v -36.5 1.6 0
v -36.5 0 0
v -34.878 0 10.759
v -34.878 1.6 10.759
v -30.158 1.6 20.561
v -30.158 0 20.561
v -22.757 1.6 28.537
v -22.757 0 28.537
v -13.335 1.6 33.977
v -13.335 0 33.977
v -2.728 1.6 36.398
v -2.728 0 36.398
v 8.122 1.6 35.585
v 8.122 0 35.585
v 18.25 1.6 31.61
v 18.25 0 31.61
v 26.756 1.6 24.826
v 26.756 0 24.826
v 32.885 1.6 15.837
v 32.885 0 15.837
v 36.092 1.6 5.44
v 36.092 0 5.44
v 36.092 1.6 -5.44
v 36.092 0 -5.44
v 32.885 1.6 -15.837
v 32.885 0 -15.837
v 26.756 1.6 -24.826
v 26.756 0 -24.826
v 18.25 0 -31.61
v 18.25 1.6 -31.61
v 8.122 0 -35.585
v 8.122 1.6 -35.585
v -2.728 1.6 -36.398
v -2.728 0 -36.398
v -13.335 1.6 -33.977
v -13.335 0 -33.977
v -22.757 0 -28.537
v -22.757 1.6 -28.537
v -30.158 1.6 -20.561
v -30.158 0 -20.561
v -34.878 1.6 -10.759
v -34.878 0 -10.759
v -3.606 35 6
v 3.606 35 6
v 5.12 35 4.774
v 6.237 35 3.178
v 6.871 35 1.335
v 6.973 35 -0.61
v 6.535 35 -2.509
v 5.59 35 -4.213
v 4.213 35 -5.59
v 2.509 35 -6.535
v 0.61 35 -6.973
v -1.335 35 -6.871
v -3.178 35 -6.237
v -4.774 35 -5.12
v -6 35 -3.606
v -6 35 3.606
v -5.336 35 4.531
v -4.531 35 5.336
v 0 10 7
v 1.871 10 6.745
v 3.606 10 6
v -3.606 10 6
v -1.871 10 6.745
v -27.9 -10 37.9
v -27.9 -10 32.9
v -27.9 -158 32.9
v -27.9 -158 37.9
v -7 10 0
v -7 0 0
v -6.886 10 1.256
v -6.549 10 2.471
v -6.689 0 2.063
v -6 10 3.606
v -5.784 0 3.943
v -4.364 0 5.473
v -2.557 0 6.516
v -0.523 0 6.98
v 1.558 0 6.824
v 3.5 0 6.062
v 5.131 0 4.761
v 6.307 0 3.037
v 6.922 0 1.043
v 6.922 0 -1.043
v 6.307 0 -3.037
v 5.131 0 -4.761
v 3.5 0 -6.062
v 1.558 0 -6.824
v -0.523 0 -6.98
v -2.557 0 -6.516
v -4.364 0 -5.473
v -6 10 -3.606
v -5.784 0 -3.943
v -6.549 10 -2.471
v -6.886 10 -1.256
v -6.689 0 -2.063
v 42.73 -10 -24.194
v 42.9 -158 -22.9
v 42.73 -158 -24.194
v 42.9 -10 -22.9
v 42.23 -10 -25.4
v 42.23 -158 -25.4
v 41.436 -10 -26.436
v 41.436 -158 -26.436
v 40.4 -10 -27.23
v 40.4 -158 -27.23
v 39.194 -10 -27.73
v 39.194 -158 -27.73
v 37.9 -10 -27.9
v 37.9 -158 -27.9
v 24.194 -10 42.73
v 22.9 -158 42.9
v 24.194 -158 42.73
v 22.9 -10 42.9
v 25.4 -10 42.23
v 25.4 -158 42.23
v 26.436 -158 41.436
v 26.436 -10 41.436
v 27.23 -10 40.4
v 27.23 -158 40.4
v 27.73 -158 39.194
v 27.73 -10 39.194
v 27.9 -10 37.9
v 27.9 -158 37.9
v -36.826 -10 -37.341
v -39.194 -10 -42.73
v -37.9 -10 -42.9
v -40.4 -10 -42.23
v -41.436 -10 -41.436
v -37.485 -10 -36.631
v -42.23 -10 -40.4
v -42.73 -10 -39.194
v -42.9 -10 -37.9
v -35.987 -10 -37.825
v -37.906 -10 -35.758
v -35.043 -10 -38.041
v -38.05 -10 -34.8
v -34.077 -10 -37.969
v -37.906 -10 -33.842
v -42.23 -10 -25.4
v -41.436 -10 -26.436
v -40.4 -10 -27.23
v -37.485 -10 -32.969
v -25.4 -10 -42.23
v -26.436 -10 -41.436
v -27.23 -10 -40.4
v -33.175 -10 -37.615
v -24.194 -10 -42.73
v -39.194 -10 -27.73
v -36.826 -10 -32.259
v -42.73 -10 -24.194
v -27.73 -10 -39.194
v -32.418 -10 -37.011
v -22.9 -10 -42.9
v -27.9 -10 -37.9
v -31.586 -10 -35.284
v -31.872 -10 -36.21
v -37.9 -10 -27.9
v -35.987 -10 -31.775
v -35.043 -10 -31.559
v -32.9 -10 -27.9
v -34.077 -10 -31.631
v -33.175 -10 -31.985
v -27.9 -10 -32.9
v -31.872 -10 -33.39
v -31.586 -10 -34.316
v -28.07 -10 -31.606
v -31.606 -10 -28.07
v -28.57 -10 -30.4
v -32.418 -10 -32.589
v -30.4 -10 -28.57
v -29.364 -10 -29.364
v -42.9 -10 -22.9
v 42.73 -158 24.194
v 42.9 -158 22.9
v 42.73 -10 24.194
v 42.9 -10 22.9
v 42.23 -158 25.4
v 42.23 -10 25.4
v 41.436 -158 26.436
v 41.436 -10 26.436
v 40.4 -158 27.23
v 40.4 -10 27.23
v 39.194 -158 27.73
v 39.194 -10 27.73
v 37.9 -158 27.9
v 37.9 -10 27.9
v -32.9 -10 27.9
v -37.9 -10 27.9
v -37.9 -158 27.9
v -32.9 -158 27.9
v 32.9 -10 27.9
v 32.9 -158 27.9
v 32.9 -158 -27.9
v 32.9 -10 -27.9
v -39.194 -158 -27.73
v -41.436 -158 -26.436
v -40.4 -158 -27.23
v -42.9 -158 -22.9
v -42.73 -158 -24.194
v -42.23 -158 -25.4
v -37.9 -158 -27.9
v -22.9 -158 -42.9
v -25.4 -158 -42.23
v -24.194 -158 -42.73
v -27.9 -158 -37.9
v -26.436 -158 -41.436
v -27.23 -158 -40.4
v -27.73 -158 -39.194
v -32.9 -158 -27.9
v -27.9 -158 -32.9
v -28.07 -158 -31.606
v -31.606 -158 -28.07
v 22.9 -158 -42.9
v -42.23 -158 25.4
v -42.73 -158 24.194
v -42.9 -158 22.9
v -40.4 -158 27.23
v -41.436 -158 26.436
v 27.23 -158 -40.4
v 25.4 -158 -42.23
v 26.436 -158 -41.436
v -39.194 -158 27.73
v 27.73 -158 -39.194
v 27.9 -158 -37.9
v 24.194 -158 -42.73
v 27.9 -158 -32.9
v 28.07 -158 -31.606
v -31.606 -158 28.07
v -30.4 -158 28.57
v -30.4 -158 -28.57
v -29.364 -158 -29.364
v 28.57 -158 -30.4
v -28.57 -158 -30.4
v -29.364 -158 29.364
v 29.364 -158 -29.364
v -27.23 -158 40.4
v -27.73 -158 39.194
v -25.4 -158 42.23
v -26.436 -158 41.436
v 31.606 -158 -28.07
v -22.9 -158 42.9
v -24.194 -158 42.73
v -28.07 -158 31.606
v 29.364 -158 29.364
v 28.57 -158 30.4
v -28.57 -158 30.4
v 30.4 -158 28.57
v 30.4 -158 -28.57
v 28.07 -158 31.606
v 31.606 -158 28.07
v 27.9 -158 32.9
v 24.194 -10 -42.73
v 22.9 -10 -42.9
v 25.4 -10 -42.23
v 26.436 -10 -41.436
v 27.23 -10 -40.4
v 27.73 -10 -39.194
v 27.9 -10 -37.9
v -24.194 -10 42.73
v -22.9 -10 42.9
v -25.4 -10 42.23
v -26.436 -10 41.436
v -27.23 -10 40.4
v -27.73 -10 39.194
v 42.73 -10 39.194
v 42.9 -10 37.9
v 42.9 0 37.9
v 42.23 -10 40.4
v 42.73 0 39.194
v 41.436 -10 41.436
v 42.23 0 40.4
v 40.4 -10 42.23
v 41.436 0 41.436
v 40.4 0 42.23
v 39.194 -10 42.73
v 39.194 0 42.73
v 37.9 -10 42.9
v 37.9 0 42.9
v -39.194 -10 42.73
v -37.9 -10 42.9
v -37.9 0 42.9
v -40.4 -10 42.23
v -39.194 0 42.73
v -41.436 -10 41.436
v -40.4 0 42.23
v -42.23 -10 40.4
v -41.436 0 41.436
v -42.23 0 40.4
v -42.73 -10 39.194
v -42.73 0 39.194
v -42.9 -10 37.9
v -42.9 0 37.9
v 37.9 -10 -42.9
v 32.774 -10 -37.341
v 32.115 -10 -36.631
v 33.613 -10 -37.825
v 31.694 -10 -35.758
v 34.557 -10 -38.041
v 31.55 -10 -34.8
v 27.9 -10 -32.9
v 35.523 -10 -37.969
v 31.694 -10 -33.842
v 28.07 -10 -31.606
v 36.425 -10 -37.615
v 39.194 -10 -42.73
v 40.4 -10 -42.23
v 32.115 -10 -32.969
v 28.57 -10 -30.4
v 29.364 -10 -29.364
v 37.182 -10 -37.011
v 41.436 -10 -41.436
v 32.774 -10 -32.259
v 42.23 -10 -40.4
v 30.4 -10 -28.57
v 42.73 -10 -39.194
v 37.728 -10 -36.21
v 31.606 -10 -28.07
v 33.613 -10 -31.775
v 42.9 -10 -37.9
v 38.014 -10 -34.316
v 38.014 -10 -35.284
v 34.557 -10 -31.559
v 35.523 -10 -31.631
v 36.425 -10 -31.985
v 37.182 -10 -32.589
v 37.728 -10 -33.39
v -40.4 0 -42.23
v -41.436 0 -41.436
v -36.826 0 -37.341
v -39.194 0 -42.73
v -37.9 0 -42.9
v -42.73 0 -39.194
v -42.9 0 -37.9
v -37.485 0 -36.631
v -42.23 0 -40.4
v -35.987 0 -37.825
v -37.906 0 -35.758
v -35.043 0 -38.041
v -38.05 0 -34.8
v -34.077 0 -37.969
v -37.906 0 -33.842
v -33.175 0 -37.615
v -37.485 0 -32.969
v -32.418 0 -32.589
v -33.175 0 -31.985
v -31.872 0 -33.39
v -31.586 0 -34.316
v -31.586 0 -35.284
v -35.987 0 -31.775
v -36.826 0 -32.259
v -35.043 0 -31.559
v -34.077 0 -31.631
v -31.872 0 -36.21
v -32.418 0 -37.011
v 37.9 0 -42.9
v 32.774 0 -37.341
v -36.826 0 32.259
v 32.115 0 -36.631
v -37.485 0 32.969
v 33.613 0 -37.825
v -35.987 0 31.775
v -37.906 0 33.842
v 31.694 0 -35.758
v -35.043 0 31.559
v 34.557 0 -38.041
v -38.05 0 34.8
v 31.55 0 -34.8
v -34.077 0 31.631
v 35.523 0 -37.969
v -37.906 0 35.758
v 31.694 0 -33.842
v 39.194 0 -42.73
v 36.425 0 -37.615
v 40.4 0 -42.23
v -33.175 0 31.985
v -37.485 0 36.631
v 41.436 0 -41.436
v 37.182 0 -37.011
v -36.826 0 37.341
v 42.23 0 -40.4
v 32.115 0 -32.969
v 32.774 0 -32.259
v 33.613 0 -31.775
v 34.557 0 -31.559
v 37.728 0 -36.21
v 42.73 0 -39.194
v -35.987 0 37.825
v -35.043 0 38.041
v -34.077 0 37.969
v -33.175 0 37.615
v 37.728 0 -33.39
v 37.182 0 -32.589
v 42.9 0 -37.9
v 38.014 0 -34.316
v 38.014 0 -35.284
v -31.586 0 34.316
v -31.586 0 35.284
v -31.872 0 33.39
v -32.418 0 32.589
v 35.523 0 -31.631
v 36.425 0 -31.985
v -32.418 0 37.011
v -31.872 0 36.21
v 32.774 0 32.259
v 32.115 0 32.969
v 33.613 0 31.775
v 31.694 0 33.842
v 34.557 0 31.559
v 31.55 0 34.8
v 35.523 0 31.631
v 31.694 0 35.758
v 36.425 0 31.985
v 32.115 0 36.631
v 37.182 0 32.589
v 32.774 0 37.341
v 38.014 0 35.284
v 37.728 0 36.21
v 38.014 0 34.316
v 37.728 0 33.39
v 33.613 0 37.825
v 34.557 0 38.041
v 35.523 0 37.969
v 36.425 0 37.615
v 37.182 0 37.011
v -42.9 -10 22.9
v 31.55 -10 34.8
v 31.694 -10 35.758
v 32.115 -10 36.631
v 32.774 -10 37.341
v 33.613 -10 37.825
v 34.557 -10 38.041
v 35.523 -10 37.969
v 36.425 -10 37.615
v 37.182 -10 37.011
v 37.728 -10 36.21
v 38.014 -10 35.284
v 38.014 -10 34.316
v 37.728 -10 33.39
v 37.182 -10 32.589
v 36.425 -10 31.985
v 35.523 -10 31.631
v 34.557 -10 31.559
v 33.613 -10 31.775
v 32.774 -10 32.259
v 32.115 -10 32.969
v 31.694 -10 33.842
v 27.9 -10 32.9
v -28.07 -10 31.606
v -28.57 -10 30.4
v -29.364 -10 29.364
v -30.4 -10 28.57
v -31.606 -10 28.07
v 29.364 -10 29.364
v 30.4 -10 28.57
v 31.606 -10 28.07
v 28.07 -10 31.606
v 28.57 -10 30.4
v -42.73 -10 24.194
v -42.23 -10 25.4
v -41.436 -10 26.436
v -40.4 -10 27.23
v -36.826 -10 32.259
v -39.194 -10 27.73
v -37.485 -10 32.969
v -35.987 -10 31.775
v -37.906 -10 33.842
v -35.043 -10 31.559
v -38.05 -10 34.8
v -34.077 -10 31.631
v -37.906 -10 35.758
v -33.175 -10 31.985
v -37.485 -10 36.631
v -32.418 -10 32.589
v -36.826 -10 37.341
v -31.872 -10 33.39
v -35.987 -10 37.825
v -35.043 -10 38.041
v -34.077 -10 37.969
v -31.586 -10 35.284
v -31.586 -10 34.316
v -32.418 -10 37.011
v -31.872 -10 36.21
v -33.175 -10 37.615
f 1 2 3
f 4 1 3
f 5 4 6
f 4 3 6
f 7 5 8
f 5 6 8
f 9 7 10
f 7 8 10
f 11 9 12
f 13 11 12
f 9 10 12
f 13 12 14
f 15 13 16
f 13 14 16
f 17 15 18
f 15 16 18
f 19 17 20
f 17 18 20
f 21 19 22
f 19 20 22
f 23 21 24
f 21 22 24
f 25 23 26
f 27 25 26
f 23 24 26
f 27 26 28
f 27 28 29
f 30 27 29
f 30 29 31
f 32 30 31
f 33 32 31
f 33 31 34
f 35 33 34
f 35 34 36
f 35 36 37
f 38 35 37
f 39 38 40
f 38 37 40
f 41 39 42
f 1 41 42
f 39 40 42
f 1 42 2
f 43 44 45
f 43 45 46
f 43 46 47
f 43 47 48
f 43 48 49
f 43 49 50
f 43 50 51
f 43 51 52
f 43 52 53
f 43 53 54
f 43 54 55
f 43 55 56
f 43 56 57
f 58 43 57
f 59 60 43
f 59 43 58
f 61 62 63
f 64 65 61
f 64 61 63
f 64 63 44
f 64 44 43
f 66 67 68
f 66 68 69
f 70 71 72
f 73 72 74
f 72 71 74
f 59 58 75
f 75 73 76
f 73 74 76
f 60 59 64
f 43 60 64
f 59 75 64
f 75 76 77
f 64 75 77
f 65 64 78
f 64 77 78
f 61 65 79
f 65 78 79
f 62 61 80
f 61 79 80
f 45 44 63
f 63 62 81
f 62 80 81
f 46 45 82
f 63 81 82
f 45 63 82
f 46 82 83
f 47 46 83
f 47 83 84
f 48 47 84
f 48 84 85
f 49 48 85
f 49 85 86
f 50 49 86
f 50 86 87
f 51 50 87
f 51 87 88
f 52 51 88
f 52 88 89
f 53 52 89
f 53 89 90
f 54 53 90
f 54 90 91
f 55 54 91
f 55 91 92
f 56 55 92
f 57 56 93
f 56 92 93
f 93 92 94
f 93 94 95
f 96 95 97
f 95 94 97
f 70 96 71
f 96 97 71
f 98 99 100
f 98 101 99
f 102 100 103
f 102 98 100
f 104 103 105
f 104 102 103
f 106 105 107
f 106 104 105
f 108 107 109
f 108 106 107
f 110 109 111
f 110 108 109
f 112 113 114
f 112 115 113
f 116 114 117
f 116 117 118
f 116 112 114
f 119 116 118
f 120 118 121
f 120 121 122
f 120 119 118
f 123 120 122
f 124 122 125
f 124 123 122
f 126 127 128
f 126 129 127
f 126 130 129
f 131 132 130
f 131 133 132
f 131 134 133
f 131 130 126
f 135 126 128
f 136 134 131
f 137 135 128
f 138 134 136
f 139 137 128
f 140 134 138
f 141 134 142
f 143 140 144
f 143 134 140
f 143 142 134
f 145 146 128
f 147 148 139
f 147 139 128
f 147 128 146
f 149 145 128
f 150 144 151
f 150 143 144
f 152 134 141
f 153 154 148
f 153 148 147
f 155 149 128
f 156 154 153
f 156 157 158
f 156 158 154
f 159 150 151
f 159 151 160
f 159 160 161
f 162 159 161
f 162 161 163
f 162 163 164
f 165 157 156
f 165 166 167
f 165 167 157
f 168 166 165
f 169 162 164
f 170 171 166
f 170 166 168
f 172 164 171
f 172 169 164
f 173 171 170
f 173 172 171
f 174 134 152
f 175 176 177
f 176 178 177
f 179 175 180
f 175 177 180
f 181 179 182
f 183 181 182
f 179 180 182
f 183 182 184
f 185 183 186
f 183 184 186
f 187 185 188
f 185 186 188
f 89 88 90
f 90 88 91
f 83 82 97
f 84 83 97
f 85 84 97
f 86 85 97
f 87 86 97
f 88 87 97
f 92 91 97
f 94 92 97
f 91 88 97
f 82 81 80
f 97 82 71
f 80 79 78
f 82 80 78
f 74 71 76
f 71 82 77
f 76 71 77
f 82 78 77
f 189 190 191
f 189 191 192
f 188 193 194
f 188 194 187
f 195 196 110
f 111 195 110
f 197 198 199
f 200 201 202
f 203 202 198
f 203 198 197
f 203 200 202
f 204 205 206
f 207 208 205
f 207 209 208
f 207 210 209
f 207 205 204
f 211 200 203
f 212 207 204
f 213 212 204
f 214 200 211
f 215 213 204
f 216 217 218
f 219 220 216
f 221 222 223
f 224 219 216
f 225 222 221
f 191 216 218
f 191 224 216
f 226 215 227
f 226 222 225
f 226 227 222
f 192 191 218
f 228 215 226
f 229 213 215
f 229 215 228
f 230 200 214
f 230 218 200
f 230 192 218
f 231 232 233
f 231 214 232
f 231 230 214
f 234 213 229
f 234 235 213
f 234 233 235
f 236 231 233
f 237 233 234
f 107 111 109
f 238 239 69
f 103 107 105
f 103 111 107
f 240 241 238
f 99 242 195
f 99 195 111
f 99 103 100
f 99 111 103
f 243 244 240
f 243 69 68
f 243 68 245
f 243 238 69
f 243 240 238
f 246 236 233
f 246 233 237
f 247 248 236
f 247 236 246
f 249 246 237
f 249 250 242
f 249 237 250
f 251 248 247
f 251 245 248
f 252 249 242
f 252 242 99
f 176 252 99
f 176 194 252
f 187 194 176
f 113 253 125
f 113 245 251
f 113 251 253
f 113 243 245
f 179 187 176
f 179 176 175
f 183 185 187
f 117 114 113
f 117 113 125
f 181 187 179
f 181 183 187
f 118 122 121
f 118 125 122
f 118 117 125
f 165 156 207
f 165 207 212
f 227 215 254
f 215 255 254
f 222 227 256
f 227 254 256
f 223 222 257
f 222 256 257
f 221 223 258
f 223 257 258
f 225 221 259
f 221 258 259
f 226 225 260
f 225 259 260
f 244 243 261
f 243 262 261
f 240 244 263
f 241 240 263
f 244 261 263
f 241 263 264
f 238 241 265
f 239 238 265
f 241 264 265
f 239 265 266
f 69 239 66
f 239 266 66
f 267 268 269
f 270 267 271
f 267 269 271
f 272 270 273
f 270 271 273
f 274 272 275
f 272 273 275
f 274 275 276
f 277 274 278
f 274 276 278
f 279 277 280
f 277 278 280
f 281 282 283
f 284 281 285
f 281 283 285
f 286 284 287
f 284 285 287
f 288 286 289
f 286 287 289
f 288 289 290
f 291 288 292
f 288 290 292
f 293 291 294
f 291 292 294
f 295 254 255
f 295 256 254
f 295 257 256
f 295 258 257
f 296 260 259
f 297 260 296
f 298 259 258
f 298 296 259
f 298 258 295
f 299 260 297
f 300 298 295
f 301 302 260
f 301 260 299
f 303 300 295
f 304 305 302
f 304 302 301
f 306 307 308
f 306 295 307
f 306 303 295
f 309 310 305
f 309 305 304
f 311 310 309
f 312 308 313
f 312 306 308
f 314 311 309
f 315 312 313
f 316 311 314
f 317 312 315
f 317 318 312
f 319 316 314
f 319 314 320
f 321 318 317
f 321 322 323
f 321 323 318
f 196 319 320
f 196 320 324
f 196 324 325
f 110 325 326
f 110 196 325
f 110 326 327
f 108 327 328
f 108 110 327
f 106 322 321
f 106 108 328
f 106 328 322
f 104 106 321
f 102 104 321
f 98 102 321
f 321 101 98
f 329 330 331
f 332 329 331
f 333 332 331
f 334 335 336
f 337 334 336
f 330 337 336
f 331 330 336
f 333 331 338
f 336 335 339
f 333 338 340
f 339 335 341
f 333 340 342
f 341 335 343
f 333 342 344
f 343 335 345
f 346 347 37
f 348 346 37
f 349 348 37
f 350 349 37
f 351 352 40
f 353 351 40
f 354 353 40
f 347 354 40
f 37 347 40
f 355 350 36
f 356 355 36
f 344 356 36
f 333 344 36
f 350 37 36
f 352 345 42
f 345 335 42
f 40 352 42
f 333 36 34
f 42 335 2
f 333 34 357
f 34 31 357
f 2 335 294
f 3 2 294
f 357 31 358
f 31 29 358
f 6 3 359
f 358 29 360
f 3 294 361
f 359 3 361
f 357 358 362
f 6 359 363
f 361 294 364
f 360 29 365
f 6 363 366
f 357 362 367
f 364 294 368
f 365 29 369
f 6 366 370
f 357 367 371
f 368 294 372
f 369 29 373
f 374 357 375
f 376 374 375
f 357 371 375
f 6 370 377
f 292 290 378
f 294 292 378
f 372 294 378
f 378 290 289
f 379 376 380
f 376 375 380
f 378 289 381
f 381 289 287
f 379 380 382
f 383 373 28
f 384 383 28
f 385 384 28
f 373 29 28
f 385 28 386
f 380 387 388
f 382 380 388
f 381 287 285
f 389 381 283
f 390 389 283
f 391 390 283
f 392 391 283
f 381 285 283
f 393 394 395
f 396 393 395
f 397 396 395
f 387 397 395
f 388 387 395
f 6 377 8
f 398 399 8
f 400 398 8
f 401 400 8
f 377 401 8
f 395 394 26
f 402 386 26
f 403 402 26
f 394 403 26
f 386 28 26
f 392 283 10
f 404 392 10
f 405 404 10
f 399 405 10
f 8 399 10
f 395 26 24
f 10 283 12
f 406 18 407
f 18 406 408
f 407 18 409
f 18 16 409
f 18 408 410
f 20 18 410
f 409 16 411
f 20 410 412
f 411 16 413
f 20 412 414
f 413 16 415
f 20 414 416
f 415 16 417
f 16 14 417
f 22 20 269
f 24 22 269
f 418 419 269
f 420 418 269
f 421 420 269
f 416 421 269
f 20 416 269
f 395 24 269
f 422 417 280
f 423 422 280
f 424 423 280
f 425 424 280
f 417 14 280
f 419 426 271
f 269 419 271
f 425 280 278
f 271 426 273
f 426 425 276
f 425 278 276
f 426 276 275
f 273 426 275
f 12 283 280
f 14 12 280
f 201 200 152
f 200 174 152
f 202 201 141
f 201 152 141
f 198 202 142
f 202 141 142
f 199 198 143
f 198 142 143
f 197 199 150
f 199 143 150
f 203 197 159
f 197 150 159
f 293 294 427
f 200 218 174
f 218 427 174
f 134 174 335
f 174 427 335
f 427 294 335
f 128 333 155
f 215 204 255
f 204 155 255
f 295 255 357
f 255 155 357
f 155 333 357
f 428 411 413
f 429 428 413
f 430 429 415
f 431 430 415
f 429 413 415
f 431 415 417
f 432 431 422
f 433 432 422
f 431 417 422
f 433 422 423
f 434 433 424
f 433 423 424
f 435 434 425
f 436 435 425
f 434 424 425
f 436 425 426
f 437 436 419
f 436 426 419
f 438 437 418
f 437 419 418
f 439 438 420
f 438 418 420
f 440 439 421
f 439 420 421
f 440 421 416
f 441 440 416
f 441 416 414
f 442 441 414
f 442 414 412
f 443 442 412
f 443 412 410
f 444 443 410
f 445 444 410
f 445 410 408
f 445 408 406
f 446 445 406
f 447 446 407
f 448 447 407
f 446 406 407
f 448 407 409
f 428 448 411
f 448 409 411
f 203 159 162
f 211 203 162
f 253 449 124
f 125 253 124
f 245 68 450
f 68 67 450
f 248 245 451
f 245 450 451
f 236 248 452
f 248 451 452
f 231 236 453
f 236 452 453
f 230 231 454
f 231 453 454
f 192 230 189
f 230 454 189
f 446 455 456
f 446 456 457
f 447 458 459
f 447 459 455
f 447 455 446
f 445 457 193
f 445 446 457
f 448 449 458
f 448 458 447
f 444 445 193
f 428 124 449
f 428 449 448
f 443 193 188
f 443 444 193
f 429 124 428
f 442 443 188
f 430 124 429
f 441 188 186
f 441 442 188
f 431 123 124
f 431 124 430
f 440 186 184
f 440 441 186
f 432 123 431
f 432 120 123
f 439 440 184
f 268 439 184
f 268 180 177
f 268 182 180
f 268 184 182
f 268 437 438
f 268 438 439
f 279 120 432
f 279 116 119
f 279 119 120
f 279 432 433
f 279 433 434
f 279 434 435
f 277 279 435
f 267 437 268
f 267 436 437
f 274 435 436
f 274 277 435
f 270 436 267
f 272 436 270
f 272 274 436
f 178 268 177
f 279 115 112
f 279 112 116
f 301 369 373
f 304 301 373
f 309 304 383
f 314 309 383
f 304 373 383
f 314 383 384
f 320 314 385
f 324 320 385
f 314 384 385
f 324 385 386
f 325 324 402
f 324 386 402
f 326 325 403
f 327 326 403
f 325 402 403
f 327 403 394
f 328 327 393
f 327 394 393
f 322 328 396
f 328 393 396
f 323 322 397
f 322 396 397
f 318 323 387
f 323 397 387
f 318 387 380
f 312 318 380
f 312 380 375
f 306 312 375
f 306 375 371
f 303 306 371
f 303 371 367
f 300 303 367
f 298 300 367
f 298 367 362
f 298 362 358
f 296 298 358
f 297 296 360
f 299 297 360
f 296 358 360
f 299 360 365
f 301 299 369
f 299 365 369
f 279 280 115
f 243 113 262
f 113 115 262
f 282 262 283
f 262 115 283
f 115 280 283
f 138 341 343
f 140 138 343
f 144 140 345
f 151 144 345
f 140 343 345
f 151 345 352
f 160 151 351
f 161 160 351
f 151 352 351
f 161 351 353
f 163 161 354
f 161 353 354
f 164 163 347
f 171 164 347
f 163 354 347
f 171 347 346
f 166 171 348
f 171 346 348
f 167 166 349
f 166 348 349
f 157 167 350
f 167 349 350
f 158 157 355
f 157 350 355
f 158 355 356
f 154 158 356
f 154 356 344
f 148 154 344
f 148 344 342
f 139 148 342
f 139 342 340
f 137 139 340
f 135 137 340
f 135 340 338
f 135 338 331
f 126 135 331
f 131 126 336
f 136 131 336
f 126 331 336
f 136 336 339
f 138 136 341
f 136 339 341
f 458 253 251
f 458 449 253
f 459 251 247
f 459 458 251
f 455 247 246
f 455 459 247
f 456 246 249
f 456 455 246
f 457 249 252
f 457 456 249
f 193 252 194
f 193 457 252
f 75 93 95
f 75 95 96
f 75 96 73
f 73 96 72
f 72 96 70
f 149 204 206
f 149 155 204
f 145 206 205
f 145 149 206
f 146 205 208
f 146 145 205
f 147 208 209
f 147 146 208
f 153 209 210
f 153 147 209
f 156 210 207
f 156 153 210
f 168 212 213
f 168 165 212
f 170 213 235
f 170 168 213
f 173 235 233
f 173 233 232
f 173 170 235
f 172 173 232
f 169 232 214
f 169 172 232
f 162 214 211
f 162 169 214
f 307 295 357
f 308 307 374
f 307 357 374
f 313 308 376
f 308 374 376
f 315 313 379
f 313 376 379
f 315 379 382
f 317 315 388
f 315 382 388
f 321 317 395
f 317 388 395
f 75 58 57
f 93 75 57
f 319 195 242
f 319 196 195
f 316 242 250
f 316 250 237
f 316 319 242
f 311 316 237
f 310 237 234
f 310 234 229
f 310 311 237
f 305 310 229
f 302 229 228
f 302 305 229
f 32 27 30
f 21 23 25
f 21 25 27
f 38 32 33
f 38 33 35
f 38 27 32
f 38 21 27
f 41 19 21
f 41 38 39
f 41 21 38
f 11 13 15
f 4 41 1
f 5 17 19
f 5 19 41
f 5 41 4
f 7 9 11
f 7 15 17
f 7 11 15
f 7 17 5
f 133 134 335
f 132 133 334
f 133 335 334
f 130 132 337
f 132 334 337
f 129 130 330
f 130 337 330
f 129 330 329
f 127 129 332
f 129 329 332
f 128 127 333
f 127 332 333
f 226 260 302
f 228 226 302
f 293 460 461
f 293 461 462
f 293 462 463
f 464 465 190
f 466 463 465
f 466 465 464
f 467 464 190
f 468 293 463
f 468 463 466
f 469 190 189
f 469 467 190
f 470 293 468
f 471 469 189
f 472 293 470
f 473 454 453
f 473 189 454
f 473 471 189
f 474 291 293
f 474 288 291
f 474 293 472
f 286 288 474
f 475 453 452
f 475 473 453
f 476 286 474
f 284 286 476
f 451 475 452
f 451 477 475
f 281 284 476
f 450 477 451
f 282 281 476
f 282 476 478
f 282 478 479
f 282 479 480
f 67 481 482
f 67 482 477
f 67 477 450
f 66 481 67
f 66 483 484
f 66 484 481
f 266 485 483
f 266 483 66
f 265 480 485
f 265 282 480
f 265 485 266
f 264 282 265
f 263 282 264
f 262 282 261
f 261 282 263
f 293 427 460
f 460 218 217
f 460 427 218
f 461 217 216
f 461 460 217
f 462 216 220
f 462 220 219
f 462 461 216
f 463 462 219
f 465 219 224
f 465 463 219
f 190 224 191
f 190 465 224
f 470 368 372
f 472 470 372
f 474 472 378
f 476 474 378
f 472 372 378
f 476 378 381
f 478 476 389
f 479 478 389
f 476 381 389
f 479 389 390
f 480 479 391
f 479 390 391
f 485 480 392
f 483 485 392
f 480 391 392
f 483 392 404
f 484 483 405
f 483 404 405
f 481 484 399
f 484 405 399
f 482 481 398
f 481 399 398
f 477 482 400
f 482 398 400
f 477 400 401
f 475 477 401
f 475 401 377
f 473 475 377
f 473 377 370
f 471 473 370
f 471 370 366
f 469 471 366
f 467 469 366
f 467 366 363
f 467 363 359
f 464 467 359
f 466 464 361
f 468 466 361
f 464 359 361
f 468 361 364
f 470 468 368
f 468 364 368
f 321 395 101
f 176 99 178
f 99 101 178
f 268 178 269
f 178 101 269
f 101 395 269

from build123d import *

# Parameters (mm, degrees)
F1_DEPTH  = 158
F2_W      = 15
F2_H      = 15
F3_DEPTH  = 148
F4_R      = 3.25
F5_DEPTH  = 10
F6_R      = 5
F7_R      = 36.5
F8_DEPTH  = 1.6
F9_R      = 7
F10_DEPTH = 35
F12_DEPTH = 25


with BuildPart() as f1:
    # F0 (on Front) → F1 (new body)
    with BuildSketch(Plane.XZ):
        with BuildLine():
            Line((37.9, 42.9), (-37.9, 42.9))
            ThreePointArc((-37.9, 42.9), (-41.4355339059, 41.4355339059), (-42.9, 37.9))
            Line((-42.9, 37.9), (-42.9, -37.9))
            ThreePointArc((-42.9, -37.9), (-41.4355339059, -41.4355339059), (-37.9, -42.9))
            Line((-37.9, -42.9), (37.9, -42.9))
            ThreePointArc((37.9, -42.9), (41.4355339059, -41.4355339059), (42.9, -37.9))
            Line((42.9, -37.9), (42.9, 37.9))
            ThreePointArc((42.9, 37.9), (41.4355339059, 41.4355339059), (37.9, 42.9))
        make_face()
    extrude(amount=F1_DEPTH)

    # F2 (on face) → F3 (cut)
    with BuildSketch(Plane.XZ.offset(158)):
        with Locations((35.4, 35.4)):
            Rectangle(F2_W, F2_H)
        with Locations((-35.4, 35.4)):
            Rectangle(F2_W, F2_H)
        with Locations((-35.4, -35.4)):
            Rectangle(F2_W, F2_H)
        with Locations((35.4, -35.4)):
            Rectangle(F2_W, F2_H)
    extrude(amount=-F3_DEPTH, mode=Mode.SUBTRACT)

    # F4 (on face) → F5 (cut, through all)
    with BuildSketch(Plane(origin=(0, 0, 0), x_dir=(-1, 0, 0), z_dir=(0, 1, 0))):
        with Locations((34.8, 34.8)):
            Circle(F4_R)
        with Locations((-34.8, 34.8)):
            Circle(F4_R)
        with Locations((34.8, -34.8)):
            Circle(F4_R)
        with Locations((-34.8, -34.8)):
            Circle(F4_R)
    extrude(amount=-F5_DEPTH, mode=Mode.SUBTRACT)

    # F6
    f6_edges = [f1.edges().sort_by_distance(p)[0] for p in [
        (-42.9, -84, 27.9),
        (-42.9, -84, -27.9),
        (-27.9, -84, -27.9),
        (-27.9, -84, -42.9),
        (27.9, -84, -42.9),
        (-27.9, -84, 42.9),
        (27.9, -84, -27.9),
        (42.9, -84, -27.9),
        (42.9, -84, 27.9),
        (27.9, -84, 42.9),
        (27.9, -84, 27.9),
        (-27.9, -84, 27.9),
    ]]
    fillet(f6_edges, radius=F6_R)

    # F7 (on face) → F8 (join)
    with BuildSketch(Plane(origin=(0, 0, 0), x_dir=(-1, 0, 0), z_dir=(0, 1, 0))):
        Circle(F7_R)
    extrude(amount=F8_DEPTH)


with BuildPart() as f10:
    # F9 (on face) → F10 (new body)
    with BuildSketch(Plane(origin=(0, 0, 0), x_dir=(-1, 0, 0), z_dir=(0, 1, 0))):
        Circle(F9_R)
    extrude(amount=F10_DEPTH)

    # F11 (on face) → F12 (cut)
    with BuildSketch(Plane(origin=(0, 35, 0), x_dir=(-1, 0, 0), z_dir=(0, 1, 0))):
        Polygon((-14.5420123405, 12.7583807334), (-14.5420123405, 6), (6, 6), (6, -12.0489969126), (13.1983235478, -12.4650839716), (13.1983235478, 12.7583807334), align=None)
    extrude(amount=-F12_DEPTH, mode=Mode.SUBTRACT)


solid = Compound([f1.part, f10.part])
